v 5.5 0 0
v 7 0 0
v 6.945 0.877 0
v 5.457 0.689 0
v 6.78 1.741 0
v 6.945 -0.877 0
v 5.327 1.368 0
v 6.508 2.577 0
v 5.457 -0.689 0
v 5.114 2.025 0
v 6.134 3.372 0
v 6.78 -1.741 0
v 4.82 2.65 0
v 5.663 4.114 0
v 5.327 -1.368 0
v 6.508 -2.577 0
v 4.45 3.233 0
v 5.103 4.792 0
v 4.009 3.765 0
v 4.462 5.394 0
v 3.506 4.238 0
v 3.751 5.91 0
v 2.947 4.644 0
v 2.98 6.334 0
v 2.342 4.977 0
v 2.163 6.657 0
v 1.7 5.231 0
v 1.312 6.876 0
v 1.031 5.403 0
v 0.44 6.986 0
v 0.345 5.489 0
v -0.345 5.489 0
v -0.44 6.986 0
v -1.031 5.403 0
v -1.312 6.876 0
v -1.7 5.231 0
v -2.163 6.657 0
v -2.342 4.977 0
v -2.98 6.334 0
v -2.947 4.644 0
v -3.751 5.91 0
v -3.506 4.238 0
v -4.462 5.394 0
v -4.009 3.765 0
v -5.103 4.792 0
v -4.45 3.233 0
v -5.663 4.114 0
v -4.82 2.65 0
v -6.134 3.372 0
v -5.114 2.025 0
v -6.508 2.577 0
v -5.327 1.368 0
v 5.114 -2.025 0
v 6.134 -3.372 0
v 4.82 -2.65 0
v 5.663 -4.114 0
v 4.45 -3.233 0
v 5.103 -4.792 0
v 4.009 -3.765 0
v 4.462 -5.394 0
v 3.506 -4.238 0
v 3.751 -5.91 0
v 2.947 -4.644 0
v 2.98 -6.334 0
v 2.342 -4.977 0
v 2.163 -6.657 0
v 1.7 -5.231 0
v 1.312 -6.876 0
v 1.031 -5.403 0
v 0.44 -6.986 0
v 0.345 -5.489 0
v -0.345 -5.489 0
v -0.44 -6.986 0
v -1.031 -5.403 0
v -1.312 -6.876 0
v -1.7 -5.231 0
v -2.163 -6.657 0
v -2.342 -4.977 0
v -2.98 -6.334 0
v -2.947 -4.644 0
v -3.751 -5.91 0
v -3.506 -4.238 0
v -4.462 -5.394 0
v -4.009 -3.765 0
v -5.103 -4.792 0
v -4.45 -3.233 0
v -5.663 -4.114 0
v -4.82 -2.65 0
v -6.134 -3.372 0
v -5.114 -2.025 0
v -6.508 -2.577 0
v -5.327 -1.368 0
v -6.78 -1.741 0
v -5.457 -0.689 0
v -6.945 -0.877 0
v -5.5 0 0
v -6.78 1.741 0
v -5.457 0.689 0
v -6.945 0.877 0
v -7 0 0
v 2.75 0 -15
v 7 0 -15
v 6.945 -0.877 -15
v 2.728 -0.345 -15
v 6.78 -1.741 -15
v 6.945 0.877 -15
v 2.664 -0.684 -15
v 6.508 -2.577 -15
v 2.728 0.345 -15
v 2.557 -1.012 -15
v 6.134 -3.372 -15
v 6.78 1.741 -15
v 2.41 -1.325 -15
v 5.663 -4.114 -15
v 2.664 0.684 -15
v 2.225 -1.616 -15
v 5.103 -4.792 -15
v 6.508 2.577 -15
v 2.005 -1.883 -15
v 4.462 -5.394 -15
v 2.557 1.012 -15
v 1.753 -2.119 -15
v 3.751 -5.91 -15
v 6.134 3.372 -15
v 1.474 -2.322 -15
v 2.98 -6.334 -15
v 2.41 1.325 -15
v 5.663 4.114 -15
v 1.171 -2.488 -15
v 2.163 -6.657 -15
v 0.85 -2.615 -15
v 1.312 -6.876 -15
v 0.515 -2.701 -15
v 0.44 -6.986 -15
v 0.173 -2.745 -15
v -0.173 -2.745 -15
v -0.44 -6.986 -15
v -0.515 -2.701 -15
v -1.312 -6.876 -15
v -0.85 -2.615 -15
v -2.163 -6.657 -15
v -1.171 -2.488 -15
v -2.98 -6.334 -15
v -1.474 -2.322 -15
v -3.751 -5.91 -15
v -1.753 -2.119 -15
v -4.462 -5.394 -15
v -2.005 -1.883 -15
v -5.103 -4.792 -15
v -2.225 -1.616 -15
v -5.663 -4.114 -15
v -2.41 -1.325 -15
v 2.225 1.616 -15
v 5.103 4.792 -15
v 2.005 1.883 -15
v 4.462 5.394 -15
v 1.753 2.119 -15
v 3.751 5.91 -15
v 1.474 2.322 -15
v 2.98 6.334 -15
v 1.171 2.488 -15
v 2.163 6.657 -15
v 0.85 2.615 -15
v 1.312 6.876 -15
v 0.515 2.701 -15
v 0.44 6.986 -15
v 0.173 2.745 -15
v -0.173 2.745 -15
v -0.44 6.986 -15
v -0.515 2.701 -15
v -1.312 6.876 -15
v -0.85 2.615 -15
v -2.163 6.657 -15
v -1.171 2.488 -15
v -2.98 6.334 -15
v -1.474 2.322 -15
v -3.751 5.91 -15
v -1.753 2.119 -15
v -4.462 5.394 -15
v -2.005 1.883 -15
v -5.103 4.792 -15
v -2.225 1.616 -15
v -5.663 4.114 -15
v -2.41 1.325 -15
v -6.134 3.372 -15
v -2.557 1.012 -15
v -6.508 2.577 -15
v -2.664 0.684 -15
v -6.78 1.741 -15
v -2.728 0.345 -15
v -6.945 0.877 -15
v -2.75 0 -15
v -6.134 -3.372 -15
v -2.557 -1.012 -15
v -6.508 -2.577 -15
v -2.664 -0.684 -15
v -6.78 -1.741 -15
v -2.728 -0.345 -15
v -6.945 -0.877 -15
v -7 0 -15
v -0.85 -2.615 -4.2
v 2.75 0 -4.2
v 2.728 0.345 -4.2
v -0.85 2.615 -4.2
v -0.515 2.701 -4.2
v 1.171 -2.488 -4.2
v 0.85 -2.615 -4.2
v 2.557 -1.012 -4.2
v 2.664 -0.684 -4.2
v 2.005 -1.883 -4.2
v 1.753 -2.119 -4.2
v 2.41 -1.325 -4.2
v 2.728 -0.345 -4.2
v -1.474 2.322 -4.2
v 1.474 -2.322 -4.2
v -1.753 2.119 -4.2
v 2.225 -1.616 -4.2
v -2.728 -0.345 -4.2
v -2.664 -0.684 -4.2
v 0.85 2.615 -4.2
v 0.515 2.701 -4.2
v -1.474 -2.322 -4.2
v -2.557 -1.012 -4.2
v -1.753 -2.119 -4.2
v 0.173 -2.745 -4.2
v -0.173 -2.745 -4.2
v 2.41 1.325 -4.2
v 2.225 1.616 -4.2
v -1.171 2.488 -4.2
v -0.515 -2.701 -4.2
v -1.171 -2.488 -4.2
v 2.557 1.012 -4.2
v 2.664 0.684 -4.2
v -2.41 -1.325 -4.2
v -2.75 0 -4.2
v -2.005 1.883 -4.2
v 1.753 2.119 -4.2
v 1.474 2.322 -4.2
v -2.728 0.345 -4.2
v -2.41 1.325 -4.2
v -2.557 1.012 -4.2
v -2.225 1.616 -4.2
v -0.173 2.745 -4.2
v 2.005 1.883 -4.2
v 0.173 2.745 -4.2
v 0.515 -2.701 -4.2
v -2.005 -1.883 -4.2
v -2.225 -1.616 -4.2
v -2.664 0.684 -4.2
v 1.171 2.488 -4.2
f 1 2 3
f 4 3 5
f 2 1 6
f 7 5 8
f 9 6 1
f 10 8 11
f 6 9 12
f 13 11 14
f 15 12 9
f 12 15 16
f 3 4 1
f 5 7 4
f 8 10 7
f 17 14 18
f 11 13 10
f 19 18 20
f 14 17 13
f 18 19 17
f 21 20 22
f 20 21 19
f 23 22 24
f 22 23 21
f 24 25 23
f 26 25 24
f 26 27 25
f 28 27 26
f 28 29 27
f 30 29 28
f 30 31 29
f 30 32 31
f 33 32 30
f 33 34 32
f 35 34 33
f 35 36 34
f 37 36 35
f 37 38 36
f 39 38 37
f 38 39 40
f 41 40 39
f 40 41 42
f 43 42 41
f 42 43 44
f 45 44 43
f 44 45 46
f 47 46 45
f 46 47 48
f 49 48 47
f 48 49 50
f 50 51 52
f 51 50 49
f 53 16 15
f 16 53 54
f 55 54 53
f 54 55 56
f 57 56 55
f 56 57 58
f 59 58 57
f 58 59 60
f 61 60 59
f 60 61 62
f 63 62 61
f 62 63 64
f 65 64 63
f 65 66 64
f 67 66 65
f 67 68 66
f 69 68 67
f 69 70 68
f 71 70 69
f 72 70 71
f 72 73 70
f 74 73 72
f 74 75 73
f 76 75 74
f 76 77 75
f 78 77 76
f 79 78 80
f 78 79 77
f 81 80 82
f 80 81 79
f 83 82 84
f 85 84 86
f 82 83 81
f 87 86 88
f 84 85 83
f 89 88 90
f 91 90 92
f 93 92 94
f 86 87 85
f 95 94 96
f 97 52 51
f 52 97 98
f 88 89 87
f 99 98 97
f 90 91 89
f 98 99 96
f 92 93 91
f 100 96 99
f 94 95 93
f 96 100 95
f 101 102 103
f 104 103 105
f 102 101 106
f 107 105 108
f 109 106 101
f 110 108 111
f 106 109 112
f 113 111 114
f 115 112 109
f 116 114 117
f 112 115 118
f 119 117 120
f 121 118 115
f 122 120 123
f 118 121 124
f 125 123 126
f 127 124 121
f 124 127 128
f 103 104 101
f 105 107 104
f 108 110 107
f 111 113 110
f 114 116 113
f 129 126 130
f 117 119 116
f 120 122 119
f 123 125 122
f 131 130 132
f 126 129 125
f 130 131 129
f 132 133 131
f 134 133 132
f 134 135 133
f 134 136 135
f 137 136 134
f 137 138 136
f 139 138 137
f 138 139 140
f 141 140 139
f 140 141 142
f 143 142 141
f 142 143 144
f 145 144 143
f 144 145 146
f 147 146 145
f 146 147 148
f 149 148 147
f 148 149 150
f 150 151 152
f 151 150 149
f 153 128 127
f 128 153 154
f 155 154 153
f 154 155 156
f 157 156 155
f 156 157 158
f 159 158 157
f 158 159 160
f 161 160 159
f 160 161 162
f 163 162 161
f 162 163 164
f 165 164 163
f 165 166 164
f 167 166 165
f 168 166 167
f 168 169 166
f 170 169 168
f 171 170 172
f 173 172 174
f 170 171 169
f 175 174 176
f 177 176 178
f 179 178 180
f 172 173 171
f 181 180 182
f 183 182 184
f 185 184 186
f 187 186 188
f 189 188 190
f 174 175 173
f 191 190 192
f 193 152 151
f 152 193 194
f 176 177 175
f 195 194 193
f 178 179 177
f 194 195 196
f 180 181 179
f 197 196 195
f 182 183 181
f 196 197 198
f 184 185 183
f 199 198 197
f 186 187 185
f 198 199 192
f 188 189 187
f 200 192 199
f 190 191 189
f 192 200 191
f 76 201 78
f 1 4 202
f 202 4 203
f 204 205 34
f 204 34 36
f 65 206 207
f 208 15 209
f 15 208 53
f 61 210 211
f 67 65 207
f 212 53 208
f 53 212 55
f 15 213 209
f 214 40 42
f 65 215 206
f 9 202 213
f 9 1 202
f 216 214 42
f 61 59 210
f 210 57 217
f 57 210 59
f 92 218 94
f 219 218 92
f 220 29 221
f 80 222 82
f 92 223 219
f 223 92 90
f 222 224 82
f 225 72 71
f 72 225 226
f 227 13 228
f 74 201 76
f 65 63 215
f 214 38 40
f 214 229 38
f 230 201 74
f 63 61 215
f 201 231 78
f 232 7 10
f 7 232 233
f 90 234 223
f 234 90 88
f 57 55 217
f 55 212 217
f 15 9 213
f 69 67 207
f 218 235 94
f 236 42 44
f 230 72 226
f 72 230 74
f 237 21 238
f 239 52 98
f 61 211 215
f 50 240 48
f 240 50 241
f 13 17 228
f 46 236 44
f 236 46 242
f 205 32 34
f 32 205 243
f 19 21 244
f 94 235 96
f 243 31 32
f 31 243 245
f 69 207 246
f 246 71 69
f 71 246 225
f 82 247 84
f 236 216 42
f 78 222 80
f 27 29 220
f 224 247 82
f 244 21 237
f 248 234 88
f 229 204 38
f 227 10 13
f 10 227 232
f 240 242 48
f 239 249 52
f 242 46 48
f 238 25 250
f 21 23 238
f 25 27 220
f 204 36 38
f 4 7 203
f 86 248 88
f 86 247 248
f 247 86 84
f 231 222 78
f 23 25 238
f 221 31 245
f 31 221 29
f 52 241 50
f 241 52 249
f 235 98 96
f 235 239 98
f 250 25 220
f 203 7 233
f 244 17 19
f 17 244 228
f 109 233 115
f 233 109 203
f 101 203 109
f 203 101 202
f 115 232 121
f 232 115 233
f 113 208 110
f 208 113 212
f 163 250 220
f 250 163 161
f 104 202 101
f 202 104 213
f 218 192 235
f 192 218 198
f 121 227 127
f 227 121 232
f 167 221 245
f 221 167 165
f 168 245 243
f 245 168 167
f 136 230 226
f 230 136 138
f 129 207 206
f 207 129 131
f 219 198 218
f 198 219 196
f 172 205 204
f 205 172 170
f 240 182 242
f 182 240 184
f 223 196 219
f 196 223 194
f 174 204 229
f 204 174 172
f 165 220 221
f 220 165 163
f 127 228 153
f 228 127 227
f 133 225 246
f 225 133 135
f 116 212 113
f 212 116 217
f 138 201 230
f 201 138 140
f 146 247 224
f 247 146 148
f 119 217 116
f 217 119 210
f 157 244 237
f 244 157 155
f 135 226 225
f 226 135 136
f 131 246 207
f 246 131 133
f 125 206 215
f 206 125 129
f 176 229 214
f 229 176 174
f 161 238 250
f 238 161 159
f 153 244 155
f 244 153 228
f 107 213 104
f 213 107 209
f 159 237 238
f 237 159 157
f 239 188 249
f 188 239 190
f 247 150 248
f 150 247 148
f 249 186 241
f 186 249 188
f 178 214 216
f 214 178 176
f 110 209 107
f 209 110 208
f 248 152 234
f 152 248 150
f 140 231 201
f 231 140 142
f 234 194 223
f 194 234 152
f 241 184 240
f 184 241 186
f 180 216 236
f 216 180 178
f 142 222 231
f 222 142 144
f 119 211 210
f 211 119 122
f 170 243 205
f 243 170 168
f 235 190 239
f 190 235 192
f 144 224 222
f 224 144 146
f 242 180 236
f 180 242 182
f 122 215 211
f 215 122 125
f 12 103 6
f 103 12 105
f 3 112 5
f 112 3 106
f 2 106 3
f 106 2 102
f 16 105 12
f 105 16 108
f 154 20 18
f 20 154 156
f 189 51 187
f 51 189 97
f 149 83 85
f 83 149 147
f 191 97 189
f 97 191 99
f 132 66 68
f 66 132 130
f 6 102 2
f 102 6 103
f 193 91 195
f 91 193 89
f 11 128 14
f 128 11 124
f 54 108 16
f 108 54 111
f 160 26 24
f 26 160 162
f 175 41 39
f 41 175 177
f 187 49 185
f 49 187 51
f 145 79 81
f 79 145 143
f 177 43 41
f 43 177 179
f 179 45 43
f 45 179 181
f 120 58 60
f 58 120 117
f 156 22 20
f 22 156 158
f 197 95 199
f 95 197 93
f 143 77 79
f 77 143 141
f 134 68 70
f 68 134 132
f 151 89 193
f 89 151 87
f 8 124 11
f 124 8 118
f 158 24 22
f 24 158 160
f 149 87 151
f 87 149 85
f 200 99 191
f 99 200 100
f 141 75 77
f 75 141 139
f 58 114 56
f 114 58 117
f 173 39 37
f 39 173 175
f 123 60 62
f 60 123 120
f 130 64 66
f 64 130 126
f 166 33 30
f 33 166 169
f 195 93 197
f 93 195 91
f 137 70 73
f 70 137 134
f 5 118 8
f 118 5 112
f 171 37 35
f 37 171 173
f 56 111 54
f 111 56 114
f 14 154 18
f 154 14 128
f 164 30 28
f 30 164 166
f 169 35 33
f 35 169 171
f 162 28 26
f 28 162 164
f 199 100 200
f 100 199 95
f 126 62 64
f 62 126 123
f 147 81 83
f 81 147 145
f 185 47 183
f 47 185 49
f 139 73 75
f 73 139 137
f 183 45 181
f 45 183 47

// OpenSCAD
$fn = 50;


difference() {
	union() {
		translate(v = [0, 0, -15.0000000000]) {
			cylinder(h = 15, r = 7.0000000000);
		}
		cylinder(h = 0, r = 17.0000000000);
	}
	union() {
		translate(v = [0, 0, 0]) {
			rotate(a = [0, 0, 0]) {
				difference() {
					union() {
						#translate(v = [0, 0, -15.0000000000]) {
							cylinder(h = 15, r = 2.2500000000);
						}
						#translate(v = [0, 0, -4.2000000000]) {
							cylinder(h = 4.2000000000, r = 7.0000000000, r1 = 2.7500000000, r2 = 5.5000000000);
						}
						#translate(v = [0, 0, -15.0000000000]) {
							cylinder(h = 15, r = 2.7500000000);
						}
						#translate(v = [0, 0, -15.0000000000]) {
							cylinder(h = 15, r = 2.2500000000);
						}
					}
					union();
				}
			}
		}
	}
}
